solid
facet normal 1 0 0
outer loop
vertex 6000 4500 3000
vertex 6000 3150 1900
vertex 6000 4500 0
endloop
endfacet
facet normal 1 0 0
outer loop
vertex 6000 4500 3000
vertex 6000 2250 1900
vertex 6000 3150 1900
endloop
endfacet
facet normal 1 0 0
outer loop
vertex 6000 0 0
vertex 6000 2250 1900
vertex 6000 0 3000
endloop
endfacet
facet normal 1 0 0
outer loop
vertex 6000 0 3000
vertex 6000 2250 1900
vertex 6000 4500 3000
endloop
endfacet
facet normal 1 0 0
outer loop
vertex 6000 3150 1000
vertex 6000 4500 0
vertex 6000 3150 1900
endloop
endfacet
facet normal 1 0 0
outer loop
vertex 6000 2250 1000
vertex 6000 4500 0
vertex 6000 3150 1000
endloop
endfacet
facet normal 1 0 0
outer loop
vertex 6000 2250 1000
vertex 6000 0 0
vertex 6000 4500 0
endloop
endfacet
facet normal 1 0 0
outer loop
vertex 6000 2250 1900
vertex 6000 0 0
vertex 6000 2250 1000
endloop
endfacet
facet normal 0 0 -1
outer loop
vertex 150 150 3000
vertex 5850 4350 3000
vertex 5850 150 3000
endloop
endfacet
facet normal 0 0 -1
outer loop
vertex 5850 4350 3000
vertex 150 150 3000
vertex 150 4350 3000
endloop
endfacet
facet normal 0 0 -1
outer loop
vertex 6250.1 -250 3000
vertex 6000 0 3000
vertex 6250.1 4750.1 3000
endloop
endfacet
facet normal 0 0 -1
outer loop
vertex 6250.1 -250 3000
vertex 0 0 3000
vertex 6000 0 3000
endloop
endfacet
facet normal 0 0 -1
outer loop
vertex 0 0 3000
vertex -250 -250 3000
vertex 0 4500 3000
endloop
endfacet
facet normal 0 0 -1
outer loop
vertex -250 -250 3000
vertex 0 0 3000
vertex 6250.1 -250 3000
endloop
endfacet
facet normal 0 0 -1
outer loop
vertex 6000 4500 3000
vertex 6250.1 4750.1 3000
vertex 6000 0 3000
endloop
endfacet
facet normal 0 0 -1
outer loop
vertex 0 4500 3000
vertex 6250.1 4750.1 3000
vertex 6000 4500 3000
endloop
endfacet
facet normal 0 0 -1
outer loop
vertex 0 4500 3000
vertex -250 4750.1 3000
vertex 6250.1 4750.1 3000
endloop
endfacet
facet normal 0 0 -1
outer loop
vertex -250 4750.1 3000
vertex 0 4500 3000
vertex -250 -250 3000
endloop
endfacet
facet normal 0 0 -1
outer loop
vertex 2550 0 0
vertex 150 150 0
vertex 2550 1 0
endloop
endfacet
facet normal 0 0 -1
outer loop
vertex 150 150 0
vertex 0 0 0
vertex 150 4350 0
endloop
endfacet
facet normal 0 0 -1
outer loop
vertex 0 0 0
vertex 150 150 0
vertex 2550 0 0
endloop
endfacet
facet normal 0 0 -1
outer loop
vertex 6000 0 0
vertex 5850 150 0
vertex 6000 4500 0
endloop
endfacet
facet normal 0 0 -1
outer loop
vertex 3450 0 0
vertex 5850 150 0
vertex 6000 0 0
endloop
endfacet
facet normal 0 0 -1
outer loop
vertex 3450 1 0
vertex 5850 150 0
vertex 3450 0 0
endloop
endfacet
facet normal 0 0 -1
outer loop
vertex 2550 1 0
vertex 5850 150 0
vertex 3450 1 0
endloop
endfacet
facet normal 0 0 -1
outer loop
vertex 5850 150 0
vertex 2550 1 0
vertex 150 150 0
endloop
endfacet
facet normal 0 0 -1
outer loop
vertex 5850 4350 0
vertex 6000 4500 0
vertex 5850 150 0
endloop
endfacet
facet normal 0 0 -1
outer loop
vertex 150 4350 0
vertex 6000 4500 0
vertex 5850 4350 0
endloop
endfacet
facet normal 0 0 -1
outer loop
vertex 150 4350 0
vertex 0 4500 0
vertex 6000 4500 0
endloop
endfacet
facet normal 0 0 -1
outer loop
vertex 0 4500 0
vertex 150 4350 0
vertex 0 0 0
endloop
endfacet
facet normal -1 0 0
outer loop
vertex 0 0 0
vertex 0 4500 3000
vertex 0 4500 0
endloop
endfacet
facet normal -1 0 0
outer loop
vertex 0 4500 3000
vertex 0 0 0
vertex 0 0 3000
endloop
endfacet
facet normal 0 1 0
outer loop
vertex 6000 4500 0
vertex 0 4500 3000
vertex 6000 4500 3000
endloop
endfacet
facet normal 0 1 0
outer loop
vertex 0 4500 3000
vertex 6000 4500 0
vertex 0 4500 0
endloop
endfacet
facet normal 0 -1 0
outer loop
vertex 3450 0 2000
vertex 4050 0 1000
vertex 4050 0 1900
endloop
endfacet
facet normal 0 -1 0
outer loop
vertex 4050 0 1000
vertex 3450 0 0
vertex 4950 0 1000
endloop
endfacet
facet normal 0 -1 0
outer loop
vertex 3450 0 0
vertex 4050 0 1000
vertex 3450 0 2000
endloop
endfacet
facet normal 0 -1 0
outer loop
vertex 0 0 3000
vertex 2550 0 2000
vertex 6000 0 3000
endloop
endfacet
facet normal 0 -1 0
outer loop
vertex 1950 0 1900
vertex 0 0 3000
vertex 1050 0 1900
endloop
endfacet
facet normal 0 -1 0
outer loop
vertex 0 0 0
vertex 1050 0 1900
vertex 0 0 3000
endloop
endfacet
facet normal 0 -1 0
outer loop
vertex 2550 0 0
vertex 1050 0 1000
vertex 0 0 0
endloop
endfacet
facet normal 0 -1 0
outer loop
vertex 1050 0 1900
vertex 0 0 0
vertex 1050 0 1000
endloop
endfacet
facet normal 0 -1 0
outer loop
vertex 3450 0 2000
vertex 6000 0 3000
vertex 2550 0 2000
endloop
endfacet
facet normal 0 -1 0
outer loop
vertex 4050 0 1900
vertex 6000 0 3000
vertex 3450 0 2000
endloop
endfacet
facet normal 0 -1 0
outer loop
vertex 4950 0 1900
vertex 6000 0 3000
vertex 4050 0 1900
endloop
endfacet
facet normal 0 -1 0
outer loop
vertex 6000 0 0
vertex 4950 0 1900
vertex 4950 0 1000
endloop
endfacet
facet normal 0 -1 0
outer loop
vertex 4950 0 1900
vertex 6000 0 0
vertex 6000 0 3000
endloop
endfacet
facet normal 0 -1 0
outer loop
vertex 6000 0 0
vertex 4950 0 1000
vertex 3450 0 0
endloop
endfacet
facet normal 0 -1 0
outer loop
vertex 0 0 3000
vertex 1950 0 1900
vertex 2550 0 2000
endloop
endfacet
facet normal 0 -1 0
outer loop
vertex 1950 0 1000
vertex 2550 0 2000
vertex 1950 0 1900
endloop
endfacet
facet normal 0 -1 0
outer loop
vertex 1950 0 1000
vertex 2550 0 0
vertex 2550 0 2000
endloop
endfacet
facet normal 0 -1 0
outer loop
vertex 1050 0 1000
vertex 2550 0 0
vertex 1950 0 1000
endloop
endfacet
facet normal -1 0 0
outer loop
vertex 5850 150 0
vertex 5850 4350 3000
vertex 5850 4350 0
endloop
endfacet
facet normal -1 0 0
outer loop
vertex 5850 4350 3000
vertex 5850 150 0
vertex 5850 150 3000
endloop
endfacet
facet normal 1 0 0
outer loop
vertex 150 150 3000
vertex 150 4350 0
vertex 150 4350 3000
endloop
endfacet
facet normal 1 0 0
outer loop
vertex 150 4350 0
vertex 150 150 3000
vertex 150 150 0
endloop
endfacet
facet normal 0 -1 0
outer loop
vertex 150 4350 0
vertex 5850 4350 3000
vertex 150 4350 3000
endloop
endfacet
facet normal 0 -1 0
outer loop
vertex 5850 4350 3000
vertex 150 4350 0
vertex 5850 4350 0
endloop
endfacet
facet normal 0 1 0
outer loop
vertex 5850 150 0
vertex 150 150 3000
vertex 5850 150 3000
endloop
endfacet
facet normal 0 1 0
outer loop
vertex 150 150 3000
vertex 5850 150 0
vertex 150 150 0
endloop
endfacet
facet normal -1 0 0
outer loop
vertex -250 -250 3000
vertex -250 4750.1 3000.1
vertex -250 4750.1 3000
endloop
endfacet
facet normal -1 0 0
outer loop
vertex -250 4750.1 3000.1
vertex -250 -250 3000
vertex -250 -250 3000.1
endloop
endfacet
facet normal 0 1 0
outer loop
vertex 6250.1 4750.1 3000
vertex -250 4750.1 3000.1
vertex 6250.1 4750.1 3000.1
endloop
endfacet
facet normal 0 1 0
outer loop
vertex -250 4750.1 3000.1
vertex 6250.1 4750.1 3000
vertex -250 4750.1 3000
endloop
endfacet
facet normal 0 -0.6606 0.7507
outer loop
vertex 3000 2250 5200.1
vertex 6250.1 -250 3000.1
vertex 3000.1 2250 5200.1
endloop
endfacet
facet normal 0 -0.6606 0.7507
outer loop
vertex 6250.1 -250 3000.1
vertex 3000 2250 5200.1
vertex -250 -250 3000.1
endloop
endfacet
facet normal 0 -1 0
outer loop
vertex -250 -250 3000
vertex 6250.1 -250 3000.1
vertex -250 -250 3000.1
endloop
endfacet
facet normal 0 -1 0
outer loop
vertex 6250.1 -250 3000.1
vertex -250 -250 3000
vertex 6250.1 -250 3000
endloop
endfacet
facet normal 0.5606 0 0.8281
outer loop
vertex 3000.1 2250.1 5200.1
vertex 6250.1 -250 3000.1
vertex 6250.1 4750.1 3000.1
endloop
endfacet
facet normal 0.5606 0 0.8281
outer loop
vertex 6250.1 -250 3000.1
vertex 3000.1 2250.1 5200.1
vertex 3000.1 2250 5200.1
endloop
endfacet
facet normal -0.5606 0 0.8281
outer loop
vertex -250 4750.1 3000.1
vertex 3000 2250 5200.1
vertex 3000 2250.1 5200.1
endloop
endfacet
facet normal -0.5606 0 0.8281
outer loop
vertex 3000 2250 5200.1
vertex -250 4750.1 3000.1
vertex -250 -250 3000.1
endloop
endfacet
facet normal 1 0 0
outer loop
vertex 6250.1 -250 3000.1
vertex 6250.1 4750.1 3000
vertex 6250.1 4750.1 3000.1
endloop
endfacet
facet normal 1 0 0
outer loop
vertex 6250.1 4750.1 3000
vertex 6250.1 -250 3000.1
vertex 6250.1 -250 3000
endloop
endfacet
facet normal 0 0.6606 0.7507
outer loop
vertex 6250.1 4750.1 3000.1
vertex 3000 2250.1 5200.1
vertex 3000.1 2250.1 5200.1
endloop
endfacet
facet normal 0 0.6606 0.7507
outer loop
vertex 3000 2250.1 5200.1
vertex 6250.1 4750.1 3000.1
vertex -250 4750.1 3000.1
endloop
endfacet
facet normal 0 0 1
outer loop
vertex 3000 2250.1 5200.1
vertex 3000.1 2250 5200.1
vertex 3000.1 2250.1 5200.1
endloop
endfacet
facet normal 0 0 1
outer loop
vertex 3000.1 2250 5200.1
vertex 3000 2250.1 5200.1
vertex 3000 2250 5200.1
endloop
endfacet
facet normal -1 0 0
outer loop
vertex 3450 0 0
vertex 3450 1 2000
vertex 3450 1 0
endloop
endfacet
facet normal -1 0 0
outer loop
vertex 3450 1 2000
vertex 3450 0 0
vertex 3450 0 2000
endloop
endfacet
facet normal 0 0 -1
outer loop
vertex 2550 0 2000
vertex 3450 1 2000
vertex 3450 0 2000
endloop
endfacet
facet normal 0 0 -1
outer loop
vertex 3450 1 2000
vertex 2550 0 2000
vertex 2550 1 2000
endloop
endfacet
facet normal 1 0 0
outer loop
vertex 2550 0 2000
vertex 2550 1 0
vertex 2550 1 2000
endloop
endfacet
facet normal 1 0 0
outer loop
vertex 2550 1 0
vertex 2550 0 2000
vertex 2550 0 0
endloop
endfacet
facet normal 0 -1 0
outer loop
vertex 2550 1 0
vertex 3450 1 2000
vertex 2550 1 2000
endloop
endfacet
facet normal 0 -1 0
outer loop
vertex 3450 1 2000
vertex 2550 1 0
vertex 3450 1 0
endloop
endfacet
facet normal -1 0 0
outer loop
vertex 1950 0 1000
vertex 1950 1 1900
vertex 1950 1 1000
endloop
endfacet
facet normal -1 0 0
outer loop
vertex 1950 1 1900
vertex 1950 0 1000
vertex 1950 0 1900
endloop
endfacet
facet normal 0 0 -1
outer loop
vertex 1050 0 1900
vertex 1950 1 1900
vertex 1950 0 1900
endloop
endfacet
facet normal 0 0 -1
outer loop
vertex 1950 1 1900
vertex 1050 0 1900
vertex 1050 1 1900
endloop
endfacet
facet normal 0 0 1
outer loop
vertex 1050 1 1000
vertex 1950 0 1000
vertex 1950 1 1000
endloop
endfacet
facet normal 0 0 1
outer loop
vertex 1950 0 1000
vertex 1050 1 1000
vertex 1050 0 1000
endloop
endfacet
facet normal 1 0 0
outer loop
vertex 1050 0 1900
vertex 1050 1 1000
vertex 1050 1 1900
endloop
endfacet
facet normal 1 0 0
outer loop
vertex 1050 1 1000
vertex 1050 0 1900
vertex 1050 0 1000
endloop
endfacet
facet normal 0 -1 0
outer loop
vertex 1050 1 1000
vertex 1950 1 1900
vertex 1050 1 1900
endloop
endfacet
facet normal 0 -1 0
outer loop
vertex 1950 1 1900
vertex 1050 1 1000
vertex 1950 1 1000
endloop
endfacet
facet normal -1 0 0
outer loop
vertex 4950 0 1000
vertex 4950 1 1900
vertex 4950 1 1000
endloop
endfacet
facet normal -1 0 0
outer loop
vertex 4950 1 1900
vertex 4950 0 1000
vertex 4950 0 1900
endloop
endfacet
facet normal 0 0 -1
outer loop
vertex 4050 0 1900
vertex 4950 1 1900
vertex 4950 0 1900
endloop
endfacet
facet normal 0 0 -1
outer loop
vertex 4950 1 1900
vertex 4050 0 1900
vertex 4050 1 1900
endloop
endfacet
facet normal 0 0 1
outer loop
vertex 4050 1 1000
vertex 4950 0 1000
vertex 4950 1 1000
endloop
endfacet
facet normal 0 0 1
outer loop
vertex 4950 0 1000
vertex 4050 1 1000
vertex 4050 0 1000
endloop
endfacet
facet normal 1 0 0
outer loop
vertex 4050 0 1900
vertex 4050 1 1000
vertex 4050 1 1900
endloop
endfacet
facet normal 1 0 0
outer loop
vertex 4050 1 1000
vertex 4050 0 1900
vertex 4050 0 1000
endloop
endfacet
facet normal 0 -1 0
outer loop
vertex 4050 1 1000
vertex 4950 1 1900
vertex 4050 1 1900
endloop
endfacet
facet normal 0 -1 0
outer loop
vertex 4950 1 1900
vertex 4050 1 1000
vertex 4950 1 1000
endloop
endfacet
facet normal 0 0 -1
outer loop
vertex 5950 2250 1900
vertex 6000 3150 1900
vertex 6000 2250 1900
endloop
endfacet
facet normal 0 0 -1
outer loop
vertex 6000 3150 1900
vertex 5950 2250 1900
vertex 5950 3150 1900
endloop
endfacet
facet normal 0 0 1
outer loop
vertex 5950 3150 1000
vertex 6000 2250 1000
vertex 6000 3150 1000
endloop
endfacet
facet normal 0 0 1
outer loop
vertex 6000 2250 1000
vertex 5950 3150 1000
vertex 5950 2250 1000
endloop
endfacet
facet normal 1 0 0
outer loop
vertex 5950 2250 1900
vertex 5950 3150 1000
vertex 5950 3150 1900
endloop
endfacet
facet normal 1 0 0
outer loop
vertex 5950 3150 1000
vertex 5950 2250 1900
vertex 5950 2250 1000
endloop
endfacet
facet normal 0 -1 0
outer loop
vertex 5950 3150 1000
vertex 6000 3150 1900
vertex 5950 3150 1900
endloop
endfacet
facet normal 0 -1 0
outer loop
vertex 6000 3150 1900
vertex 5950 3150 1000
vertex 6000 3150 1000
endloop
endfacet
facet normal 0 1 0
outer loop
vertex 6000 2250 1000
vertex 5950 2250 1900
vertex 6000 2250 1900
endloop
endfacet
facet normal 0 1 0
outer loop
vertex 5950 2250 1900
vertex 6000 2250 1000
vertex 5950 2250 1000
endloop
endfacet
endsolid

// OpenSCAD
// house3.scad - Simple house with hip (pyramidal) roof
// Units: millimeters
// Axes: X = left↔right, Y = front↔back (front at Y=0), Z = up
// Origin: lower-front-left corner of the main footprint

// Parameters
W = 6000;              // overall width (X)
D = 4500;              // overall depth (Y)
H_wall = 3000;         // wall height to eaves
t_wall = 150;          // wall thickness for shell
roof_overhang = 250;   // uniform overhang on all sides
H_roof = 2200;         // apex height above eaves
door_w = 900;          // door width
door_h = 2000;         // door height
win_w = 900;           // window width
win_h = 900;           // window height
mullion = 60;          // mullion thickness
sill_h = 1000;         // window sill height above ground
reveal = 50;           // door/window inset depth

module house() {
    difference() {
        // Main house body with hip roof
        union() {
            // Wall shell - rectangular prism footprint shelled inward
            difference() {
                cube([W, D, H_wall]);
                translate([t_wall, t_wall, 0])
                    cube([W - 2*t_wall, D - 2*t_wall, H_wall]);
            }
            
            // Hip roof - pyramidal roof with overhang
            // Create the base rectangle with overhang
            base_points = [
                [-roof_overhang, -roof_overhang, H_wall],
                [W + roof_overhang, -roof_overhang, H_wall],
                [W + roof_overhang, D + roof_overhang, H_wall],
                [-roof_overhang, D + roof_overhang, H_wall]
            ];
            
            // Apex point at center
            apex = [W/2, D/2, H_wall + H_roof];
            
            // Create the hip roof using hull of base and apex
            hull() {
                // Base rectangle
                for (point = base_points) {
                    translate(point) cube(0.1);
                }
                // Apex
                translate(apex) cube(0.1);
            }
        }
        
        // Front door (Y=0 face) - centered
        translate([W/2 - door_w/2, -reveal, 0])
            cube([door_w, reveal + 1, door_h]);
        
        // Left front window (Y=0 face)
        translate([0.25*W - win_w/2, -reveal, sill_h])
            cube([win_w, reveal + 1, win_h]);
        
        // Right front window (Y=0 face)
        translate([0.75*W - win_w/2, -reveal, sill_h])
            cube([win_w, reveal + 1, win_h]);
        
        // Right-side window (X=W face)
        translate([W - reveal, 0.6*D - win_w/2, sill_h])
            cube([reveal + 1, win_w, win_h]);
        
        // Mullions for left front window (2x2 grid)
        // Vertical mullion
        translate([0.25*W - mullion/2, -reveal, sill_h])
            cube([mullion, reveal + 1, win_h]);
        // Horizontal mullion
        translate([0.25*W - win_w/2, -reveal, sill_h + win_h/2 - mullion/2])
            cube([win_w, reveal + 1, mullion]);
        
        // Mullions for right front window (2x2 grid)
        // Vertical mullion
        translate([0.75*W - mullion/2, -reveal, sill_h])
            cube([mullion, reveal + 1, win_h]);
        // Horizontal mullion
        translate([0.75*W - win_w/2, -reveal, sill_h + win_h/2 - mullion/2])
            cube([win_w, reveal + 1, mullion]);
        
        // Mullions for right-side window (2x2 grid)
        // Vertical mullion
        translate([W - reveal, 0.6*D - mullion/2, sill_h])
            cube([reveal + 1, mullion, win_h]);
        // Horizontal mullion
        translate([W - reveal, 0.6*D - win_w/2, sill_h + win_h/2 - mullion/2])
            cube([reveal + 1, win_w, mullion]);
    }
}

// Render the house
house();
